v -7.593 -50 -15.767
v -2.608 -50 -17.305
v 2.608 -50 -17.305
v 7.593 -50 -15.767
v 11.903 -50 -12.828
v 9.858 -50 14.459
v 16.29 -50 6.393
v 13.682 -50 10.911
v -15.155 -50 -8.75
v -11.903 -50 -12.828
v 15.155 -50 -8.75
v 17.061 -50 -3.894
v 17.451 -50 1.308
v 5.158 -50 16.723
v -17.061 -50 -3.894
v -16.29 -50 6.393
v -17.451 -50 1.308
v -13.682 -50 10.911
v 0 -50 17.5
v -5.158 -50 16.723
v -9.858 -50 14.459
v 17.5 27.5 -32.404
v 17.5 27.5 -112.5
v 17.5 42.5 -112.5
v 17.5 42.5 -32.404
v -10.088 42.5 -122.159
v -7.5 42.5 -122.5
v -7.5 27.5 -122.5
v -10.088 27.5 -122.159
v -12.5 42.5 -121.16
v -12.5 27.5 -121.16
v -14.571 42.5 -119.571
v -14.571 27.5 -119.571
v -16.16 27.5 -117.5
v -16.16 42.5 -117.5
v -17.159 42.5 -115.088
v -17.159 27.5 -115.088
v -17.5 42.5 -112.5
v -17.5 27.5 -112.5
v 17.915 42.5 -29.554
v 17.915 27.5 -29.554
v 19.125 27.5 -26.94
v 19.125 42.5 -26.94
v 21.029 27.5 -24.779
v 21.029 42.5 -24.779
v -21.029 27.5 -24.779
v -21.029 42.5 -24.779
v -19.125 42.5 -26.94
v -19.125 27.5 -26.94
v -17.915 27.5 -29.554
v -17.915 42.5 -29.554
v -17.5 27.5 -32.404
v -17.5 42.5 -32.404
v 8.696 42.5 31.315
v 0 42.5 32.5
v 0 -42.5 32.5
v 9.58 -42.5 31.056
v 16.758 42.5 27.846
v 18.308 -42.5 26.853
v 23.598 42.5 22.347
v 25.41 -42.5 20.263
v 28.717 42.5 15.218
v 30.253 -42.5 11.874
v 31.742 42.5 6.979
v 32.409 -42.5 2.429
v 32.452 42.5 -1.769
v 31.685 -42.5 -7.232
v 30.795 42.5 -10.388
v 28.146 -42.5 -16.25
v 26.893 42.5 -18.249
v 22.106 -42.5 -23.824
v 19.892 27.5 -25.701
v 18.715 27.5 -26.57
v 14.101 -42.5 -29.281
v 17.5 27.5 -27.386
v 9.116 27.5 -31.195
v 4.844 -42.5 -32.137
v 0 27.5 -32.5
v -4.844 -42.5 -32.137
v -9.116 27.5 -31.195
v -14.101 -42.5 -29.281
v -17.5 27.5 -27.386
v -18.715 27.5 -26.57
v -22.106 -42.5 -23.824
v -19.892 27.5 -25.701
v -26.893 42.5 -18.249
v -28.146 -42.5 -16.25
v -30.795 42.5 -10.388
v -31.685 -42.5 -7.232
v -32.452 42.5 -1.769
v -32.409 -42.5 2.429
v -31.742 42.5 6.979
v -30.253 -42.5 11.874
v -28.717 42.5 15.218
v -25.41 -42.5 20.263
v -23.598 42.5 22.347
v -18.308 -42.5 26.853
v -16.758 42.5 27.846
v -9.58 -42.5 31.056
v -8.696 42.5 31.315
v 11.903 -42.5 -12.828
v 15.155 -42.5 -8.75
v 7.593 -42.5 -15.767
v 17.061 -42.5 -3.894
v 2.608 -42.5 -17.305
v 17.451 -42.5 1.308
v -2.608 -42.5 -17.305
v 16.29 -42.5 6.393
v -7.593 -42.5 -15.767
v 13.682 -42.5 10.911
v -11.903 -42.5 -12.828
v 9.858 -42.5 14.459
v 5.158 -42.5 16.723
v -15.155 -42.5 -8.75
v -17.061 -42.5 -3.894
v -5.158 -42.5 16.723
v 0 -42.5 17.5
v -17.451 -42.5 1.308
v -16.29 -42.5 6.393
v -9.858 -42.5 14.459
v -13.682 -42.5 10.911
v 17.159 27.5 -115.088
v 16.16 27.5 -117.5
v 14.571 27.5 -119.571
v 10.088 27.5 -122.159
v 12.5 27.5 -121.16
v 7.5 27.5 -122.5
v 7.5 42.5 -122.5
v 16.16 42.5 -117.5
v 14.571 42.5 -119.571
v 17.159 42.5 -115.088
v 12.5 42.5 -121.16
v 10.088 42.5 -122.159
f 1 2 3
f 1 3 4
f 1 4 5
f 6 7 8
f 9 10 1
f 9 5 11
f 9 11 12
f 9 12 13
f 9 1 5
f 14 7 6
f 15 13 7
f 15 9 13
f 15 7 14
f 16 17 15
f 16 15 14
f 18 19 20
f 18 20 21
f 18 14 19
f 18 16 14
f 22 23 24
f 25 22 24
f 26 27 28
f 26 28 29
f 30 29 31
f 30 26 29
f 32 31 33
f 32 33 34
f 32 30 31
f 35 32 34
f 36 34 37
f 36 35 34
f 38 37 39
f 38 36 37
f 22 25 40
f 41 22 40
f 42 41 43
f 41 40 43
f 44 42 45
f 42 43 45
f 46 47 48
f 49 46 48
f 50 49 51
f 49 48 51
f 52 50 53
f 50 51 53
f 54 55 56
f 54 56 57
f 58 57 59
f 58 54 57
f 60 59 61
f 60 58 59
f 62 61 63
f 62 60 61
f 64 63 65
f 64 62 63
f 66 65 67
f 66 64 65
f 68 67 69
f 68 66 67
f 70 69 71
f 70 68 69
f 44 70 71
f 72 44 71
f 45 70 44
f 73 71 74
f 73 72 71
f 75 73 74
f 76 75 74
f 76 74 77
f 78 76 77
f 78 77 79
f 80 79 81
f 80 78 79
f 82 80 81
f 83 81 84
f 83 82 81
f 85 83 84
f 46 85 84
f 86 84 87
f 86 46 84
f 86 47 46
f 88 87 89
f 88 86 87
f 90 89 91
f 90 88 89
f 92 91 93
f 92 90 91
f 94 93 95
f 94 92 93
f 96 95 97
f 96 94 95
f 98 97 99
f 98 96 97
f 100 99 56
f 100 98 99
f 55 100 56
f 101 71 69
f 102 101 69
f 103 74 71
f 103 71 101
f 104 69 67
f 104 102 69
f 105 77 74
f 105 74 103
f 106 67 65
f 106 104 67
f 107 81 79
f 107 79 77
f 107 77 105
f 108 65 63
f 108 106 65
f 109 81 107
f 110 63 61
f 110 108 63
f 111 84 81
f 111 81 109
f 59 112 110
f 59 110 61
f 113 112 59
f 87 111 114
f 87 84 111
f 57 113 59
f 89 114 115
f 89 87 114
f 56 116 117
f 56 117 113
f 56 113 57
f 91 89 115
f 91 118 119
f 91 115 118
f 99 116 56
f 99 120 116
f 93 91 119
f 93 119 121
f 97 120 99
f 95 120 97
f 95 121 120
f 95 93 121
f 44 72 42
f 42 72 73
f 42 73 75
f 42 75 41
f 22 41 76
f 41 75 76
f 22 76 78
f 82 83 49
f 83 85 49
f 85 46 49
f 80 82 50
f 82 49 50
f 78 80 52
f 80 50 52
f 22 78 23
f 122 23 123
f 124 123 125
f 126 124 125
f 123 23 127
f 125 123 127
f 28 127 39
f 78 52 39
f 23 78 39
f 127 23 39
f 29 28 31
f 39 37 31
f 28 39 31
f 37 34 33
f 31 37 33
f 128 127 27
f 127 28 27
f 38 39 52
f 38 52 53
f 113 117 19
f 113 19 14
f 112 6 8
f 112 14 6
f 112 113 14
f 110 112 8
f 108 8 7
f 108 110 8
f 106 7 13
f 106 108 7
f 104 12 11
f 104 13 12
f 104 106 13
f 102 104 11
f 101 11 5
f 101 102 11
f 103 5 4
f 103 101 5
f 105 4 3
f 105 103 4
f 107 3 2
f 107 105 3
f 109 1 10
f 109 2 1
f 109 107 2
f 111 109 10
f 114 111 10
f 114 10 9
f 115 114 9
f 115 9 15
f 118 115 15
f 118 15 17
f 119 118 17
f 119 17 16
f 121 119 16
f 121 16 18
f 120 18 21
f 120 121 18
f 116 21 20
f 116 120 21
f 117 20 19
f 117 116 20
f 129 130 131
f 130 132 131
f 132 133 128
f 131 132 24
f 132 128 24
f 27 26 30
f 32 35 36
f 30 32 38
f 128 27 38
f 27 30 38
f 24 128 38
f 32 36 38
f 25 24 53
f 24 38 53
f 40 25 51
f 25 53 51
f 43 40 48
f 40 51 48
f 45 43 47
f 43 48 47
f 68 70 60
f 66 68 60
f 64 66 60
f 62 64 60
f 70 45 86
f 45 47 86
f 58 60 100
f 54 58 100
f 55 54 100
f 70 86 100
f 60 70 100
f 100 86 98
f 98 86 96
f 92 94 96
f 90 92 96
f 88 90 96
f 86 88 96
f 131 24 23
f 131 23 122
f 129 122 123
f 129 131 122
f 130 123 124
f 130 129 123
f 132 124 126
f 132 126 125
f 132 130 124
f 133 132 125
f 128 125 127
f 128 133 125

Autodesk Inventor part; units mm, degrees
ref_plane "YZ Plane" through (0, 0, 0) normal (1, 0, 0) x (0, 1, 0)
ref_plane "XZ Plane" through (0, 0, 0) normal (0, 1, 0) x (-1, 0, 0)
ref_plane "XY Plane" through (0, 0, 0) normal (0, 0, 1) x (1, 0, 0)
sketch "Sketch1" plane through (0, 0, 0) normal (1, 0, 0) x (0, 1, 0)
  line L0 (42.5, 32.5) -> (-42.5, 32.5)
  line L1 (-42.5, 32.5) -> (-42.5, -32.5)
  line L2 (-42.5, -32.5) -> (42.5, -32.5)
  line L3 (42.5, -32.5) -> (42.5, 32.5)
  line L4 (42.5, 32.5) -> (-42.5, -32.5) construction
  line L5 (-42.5, 32.5) -> (42.5, -32.5) construction
  line L6 (-35, 17.5) -> (-50, 17.5)
  line L7 (-50, 17.5) -> (-50, -17.5)
  line L8 (-50, -17.5) -> (-35, -17.5)
  line L9 (-35, -17.5) -> (-35, 17.5)
  line L10 (-35, 17.5) -> (-50, -17.5) construction
  line L11 (-50, 17.5) -> (-35, -17.5) construction
  line L12 (42.5, 0) -> (-50, 0)
  line L13 (42.5, 0) -> (27.5, 0)
  line L14 (27.5, 0) -> (27.5, -122.5)
  line L15 (27.5, -122.5) -> (42.5, -122.5)
  line L16 (42.5, -122.5) -> (42.5, 0)
  point P0 (0, 0)
  point P1 (-42.5, 0)
  point P2 (-42.5, -17.5)
  dimension "d0" = 85
  dimension "d1" = 65
  dimension "d2" = 15
  dimension "d3" = 35
  dimension "d5" = 15
  dimension "d6" = 122.5
revolve "Revolution1" add sketch "Sketch1" angle 360 mid plane about axis through (0, 42.5, 0) along (0, -1, 0) contours L3 L2 L14 L12 | L14 L2 L1 L8 L9 L12 | L12 L9 L8 L1 | L1 L8 L7 L12
extrude "Extrusion1" add sketch "Sketch1" along normal mid plane 35 contours L3 L2 L14 L12 | L16 L15 L14 L2
fillet "Fillet1" radius 10 2 edges at (17.5, 35, -27.3861) (-17.5, 35, -27.3861)
fillet "Fillet2" radius 10 2 edges at (17.5, 35, -122.5) (-17.5, 35, -122.5)
properties part number "Wkp 01.03.2"
